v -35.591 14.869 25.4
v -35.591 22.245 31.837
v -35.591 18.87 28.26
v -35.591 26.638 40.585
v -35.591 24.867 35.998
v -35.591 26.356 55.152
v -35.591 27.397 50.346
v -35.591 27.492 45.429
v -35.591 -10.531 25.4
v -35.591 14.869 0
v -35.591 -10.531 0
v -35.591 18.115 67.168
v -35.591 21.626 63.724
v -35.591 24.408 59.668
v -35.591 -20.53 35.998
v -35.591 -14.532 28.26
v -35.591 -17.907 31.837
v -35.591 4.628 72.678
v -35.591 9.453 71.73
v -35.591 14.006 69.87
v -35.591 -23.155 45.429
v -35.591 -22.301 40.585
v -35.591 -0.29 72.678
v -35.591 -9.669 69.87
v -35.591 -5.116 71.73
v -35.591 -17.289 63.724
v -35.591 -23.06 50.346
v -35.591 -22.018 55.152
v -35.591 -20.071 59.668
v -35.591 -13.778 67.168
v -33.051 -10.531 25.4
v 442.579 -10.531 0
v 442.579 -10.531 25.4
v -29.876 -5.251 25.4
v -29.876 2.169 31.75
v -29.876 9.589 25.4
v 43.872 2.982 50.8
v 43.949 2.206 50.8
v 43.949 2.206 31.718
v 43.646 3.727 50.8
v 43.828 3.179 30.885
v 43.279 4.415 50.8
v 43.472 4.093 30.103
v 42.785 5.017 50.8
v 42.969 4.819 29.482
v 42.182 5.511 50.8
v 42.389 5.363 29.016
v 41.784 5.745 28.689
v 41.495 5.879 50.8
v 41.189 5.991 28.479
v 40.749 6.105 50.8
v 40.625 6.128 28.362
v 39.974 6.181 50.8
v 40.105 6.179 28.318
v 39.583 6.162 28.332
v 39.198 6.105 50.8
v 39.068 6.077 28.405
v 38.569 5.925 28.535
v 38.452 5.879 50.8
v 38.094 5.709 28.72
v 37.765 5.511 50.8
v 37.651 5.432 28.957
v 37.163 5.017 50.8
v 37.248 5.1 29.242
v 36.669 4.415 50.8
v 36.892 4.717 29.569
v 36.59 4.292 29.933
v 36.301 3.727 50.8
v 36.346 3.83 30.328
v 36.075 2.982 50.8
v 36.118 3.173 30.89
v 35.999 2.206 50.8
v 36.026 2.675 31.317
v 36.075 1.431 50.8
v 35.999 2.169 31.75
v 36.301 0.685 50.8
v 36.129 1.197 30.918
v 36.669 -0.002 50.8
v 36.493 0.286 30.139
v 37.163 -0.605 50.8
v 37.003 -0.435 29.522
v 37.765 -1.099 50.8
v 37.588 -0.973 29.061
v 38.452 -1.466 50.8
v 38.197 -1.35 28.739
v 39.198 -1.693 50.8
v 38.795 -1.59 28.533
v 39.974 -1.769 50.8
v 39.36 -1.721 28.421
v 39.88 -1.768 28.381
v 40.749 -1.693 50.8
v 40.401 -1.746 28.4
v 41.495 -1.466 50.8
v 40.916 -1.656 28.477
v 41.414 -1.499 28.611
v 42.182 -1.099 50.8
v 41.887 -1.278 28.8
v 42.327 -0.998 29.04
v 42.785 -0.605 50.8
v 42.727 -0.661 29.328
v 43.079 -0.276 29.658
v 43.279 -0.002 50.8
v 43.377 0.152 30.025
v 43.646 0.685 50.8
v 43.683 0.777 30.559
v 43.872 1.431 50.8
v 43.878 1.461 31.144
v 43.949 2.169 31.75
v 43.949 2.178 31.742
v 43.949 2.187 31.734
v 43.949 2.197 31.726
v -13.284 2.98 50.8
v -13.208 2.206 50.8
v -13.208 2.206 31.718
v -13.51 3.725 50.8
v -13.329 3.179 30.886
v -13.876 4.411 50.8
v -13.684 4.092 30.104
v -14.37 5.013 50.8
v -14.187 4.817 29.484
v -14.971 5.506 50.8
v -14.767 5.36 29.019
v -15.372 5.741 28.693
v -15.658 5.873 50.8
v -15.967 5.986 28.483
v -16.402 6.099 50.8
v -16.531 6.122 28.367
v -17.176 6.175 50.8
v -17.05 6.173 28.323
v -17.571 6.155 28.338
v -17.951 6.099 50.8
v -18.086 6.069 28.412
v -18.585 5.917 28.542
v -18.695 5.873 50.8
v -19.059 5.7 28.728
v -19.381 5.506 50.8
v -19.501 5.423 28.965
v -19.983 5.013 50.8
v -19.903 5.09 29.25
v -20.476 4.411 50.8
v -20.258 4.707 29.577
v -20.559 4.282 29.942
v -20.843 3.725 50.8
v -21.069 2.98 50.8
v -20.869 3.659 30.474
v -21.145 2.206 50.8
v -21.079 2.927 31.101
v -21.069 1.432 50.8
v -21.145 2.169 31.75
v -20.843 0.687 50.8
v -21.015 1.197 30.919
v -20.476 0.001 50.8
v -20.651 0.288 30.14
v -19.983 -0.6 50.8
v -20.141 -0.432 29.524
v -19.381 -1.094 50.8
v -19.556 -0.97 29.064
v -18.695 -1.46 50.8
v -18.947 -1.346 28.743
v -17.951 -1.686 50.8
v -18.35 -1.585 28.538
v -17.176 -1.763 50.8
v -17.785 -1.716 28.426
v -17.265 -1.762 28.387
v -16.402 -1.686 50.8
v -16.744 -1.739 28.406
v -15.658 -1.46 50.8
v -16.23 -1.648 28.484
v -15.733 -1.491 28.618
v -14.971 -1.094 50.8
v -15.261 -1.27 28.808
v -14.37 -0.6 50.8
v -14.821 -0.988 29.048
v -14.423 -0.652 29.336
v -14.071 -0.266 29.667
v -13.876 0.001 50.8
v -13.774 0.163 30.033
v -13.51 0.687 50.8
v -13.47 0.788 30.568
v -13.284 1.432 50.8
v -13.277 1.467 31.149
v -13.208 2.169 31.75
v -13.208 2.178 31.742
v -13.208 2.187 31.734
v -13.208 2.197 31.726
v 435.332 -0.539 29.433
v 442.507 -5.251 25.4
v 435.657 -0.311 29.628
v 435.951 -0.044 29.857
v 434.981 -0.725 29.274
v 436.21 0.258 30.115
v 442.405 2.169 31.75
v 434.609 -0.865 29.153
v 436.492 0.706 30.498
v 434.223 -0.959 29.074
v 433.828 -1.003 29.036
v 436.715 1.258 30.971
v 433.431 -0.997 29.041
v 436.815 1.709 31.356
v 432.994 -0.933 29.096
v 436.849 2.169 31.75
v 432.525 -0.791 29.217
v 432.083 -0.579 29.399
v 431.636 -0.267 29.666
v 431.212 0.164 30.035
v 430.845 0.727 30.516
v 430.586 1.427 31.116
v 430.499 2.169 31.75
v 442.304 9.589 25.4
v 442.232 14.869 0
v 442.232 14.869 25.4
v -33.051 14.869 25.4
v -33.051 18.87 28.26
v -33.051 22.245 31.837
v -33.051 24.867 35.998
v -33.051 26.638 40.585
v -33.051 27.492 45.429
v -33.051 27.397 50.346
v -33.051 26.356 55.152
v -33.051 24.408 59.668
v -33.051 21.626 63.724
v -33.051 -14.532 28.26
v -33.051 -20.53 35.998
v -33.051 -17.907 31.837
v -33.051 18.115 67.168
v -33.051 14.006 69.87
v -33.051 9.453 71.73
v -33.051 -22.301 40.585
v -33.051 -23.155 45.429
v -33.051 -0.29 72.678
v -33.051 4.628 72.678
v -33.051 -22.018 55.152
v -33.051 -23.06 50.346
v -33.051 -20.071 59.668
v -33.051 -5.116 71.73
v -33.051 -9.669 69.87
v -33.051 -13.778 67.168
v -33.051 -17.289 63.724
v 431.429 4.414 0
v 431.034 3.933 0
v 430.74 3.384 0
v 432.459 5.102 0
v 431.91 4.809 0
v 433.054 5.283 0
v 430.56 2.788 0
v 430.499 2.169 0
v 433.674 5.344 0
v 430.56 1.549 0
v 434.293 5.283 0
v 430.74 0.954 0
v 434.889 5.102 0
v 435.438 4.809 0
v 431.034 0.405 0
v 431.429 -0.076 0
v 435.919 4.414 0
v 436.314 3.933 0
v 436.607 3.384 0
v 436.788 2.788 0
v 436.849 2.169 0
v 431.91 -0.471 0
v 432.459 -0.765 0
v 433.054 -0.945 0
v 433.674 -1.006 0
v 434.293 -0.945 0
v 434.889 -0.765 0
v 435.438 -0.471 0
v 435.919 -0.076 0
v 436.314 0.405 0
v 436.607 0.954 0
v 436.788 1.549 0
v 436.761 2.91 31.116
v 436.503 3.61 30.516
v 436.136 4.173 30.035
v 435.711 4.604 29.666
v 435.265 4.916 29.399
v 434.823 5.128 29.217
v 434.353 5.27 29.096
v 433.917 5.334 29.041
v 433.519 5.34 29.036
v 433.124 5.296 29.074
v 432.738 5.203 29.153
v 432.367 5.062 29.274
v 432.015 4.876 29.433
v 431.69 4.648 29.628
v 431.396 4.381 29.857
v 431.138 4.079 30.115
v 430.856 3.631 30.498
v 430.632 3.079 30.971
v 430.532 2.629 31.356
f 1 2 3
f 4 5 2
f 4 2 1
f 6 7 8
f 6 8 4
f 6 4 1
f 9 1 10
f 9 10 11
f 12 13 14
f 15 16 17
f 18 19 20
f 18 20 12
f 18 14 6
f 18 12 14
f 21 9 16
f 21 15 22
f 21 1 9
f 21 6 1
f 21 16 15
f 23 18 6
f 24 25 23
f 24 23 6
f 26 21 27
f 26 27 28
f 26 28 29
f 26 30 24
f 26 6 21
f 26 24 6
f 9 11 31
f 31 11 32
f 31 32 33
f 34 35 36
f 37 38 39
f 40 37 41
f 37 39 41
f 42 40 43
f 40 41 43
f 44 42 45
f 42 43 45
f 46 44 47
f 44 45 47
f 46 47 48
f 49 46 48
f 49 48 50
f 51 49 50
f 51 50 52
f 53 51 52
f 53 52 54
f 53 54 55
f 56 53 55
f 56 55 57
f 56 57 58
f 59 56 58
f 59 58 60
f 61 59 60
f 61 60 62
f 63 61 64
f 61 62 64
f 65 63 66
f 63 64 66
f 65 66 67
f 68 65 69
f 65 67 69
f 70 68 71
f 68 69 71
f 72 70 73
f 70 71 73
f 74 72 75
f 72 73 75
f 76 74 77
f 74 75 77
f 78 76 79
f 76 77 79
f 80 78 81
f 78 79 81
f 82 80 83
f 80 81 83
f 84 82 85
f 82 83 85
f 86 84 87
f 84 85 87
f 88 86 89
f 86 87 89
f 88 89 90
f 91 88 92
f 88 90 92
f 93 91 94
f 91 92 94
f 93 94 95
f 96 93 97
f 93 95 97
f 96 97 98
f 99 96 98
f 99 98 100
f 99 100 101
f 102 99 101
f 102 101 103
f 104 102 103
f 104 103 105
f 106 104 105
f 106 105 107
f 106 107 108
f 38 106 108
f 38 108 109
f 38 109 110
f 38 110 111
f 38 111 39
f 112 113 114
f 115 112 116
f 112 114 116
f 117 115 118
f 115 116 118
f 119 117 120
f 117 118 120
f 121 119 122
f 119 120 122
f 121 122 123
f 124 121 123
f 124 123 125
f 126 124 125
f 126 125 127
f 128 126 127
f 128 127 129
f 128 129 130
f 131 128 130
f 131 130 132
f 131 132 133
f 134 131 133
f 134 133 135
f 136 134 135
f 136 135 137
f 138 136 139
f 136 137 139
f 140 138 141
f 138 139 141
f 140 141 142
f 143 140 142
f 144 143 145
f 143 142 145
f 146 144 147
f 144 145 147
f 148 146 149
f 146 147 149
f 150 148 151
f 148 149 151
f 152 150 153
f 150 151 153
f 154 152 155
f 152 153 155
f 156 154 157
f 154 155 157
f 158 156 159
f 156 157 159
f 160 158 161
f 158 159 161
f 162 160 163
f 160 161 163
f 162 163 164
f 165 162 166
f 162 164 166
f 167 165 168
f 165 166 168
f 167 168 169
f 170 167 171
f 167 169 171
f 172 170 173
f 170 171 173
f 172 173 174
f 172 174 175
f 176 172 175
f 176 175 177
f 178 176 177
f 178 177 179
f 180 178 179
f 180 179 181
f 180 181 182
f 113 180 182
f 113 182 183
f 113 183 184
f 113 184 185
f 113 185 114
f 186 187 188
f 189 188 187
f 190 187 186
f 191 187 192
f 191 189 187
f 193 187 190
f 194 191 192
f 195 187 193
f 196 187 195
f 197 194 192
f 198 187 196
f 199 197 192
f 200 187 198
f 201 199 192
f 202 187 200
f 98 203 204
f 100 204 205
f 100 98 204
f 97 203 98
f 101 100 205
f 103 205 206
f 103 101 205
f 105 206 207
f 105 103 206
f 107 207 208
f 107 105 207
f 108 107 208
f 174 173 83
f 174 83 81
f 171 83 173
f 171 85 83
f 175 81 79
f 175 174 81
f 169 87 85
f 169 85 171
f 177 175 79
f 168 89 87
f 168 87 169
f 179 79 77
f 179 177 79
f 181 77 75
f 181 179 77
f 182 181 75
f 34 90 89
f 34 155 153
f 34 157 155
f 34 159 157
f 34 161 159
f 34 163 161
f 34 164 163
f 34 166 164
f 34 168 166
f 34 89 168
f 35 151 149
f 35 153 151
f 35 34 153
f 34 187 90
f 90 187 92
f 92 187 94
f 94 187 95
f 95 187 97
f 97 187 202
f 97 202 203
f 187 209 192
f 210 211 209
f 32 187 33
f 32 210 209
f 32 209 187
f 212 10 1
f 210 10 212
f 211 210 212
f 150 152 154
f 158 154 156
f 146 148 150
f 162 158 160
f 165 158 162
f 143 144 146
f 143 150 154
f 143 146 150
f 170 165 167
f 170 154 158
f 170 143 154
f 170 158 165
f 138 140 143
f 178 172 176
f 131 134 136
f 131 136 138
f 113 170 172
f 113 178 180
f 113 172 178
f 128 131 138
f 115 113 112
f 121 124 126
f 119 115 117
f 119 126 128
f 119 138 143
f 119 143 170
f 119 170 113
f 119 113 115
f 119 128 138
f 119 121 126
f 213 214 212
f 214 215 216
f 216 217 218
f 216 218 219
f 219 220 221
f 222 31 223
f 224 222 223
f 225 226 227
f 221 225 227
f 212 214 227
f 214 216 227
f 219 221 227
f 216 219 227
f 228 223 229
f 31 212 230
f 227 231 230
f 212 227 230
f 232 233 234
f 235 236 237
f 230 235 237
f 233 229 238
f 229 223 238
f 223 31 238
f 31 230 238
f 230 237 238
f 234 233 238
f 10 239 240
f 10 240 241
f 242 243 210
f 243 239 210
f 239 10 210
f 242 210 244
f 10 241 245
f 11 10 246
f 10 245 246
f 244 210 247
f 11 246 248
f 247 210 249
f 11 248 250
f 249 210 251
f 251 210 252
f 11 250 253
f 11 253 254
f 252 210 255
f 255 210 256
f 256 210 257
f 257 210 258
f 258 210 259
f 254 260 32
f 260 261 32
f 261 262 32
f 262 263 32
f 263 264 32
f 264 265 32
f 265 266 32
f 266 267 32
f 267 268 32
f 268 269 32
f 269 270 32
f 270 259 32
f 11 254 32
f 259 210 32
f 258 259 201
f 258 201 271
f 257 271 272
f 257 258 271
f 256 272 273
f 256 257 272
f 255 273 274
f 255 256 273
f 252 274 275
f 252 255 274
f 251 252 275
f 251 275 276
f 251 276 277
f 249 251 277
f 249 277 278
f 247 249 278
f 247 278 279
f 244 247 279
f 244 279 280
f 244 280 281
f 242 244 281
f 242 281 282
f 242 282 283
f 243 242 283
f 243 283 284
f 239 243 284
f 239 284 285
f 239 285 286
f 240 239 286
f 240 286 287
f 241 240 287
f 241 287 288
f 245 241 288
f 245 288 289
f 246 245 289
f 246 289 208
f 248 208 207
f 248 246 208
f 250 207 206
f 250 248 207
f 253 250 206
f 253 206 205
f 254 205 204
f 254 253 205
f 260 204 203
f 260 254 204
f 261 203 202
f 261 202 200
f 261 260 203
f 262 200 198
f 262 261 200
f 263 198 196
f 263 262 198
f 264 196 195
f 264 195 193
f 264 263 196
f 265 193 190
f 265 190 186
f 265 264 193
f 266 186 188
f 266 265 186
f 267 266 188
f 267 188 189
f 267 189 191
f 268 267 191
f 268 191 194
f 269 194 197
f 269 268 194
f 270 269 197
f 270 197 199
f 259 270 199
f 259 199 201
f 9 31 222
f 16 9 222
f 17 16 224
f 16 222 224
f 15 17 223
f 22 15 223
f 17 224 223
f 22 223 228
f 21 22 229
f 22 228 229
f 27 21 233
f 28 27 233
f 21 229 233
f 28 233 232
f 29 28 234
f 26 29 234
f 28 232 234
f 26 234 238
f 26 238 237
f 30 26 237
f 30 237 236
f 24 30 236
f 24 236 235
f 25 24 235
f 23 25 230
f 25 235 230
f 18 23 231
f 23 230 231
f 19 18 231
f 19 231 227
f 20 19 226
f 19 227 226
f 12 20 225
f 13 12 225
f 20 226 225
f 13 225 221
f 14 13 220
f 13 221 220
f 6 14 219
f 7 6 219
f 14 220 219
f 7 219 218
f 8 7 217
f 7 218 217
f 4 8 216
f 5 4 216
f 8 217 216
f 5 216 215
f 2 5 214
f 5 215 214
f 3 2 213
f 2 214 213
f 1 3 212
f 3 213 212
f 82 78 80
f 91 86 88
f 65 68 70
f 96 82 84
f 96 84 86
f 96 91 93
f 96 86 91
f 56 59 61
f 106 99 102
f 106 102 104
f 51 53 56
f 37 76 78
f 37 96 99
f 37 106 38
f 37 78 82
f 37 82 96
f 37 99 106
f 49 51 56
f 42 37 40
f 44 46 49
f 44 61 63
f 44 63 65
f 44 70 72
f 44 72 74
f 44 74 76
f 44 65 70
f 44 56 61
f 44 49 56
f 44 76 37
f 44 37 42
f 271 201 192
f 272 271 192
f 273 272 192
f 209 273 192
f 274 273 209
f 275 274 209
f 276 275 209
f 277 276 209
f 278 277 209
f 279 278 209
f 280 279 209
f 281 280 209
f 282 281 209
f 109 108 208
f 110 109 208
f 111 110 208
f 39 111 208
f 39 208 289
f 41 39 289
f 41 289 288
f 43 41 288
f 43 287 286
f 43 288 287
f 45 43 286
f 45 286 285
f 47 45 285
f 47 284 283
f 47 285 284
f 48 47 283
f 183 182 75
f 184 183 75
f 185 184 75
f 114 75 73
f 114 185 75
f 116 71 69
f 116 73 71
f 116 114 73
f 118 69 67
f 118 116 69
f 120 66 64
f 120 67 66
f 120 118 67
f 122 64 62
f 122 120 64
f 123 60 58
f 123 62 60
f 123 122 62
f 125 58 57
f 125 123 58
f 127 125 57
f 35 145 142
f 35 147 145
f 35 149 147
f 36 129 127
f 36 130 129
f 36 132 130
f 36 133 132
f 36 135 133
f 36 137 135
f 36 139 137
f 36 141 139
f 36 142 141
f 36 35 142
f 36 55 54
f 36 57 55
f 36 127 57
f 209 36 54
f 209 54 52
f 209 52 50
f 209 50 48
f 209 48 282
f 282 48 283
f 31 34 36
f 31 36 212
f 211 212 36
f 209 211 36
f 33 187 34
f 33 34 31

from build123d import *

# Parameters (mm, degrees)
F0_W          = 508
F0_H          = 25.4
F1_DEPTH      = 25.4
F3_DEPTH      = 508.001
F4_R          = 3.96875
F4_R_2        = 3.9751
F5_DEPTH      = 50.8
F6_R          = 3.175
F7_DEPTH      = 84.328
F7_DEPTH_BACK = 61.468
F9_DEPTH      = 25.4
F10_DEPTH     = 148.59
F11_W         = 25.4
F11_H         = 25.4
F12_DEPTH     = 3.175
F13_W         = 25.4
F13_H         = 25.4
F14_DEPTH     = 2.54


with BuildPart() as f1:
    # F0 (on Top) → F1 (new body)
    with BuildSketch(Plane.XY):
        with Locations((224.1236992961, 2.1686004475)):
            Rectangle(F0_W, F0_H)
    extrude(amount=F1_DEPTH)

    # F2 (on face) → F3 (join, through all)
    with BuildSketch(Plane(origin=(-29.8763007039, 0, 0), x_dir=(0, -1, 0), z_dir=(-1, 0, 0))):
        Polygon((-2.1686004475, 25.4), (-2.1686004475, 31.75), (-9.5885356279, 25.4), align=None)
        Polygon((5.251334733, 25.4), (-2.1686004475, 31.75), (-2.1686004475, 25.4), align=None)
    extrude(amount=-F3_DEPTH)

    # F4 (on Top) → F5 (join)
    with BuildSketch(Plane.XY):
        with Locations((-17.1763007039, 2.2061855998)):
            Circle(F4_R)
        with Locations((39.9736992961, 2.2061855998)):
            Circle(F4_R_2)
    extrude(amount=F5_DEPTH)

    # F6 (on Top) → F7 (cut, two sides)
    with BuildSketch(Plane.XY) as f7_sk:
        with Locations((433.6736992961, 2.1686004475)):
            Circle(F6_R)
    extrude(amount=F7_DEPTH, mode=Mode.SUBTRACT)
    extrude(f7_sk.sketch, amount=-F7_DEPTH_BACK, mode=Mode.SUBTRACT)


with BuildPart() as f9:
    # F8 (on Top) → F9 (new body)
    with BuildSketch(Plane.XY):
        Polygon((487.5240470482, 27.3656504085), (442.0609761506, 27.3656504085), (442.7554455138, -23.4296024435), (487.5240470482, -22.8175290615), align=None)
    extrude(amount=F9_DEPTH)


with BuildPart() as f10_tool:
    # F8 (on Top) → F10 (new body)
    with BuildSketch(Plane.XY):
        Polygon((487.5240470482, 27.3656504085), (442.0609761506, 27.3656504085), (442.7554455138, -23.4296024435), (487.5240470482, -22.8175290615), align=None)
    extrude(amount=F10_DEPTH)


with BuildPart() as f1_1:
    add(f1.part)

    # F10: cut by f10_tool
    add(f10_tool.part, mode=Mode.SUBTRACT)

    # F11 (on face) → F12 (join)
    with BuildSketch(Plane(origin=(-29.8763007039, 0, 0), x_dir=(0, -1, 0), z_dir=(-1, 0, 0))):
        with Locations((-2.1686004475, 12.7)):
            Rectangle(F11_W, F11_H)
    extrude(amount=F12_DEPTH)

    # F13 (on face) → F14 (join)
    with BuildSketch(Plane(origin=(-33.0513007039, 0, 0), x_dir=(0, -1, 0), z_dir=(-1, 0, 0))):
        with BuildLine():
            ThreePointArc((10.5313995525, 25.4), (-2.1686004475, 72.7970452561), (-14.8686004475, 25.4))
            Line((-14.8686004475, 25.4), (10.5313995525, 25.4))
        make_face()
        with Locations((-2.1686004475, 12.7)):
            Rectangle(F13_W, F13_H)
    extrude(amount=F14_DEPTH)


with BuildPart() as f9_1:
    add(f9.part)

    # F10: cut by f10_tool
    add(f10_tool.part, mode=Mode.SUBTRACT)


solid = f1_1.part
